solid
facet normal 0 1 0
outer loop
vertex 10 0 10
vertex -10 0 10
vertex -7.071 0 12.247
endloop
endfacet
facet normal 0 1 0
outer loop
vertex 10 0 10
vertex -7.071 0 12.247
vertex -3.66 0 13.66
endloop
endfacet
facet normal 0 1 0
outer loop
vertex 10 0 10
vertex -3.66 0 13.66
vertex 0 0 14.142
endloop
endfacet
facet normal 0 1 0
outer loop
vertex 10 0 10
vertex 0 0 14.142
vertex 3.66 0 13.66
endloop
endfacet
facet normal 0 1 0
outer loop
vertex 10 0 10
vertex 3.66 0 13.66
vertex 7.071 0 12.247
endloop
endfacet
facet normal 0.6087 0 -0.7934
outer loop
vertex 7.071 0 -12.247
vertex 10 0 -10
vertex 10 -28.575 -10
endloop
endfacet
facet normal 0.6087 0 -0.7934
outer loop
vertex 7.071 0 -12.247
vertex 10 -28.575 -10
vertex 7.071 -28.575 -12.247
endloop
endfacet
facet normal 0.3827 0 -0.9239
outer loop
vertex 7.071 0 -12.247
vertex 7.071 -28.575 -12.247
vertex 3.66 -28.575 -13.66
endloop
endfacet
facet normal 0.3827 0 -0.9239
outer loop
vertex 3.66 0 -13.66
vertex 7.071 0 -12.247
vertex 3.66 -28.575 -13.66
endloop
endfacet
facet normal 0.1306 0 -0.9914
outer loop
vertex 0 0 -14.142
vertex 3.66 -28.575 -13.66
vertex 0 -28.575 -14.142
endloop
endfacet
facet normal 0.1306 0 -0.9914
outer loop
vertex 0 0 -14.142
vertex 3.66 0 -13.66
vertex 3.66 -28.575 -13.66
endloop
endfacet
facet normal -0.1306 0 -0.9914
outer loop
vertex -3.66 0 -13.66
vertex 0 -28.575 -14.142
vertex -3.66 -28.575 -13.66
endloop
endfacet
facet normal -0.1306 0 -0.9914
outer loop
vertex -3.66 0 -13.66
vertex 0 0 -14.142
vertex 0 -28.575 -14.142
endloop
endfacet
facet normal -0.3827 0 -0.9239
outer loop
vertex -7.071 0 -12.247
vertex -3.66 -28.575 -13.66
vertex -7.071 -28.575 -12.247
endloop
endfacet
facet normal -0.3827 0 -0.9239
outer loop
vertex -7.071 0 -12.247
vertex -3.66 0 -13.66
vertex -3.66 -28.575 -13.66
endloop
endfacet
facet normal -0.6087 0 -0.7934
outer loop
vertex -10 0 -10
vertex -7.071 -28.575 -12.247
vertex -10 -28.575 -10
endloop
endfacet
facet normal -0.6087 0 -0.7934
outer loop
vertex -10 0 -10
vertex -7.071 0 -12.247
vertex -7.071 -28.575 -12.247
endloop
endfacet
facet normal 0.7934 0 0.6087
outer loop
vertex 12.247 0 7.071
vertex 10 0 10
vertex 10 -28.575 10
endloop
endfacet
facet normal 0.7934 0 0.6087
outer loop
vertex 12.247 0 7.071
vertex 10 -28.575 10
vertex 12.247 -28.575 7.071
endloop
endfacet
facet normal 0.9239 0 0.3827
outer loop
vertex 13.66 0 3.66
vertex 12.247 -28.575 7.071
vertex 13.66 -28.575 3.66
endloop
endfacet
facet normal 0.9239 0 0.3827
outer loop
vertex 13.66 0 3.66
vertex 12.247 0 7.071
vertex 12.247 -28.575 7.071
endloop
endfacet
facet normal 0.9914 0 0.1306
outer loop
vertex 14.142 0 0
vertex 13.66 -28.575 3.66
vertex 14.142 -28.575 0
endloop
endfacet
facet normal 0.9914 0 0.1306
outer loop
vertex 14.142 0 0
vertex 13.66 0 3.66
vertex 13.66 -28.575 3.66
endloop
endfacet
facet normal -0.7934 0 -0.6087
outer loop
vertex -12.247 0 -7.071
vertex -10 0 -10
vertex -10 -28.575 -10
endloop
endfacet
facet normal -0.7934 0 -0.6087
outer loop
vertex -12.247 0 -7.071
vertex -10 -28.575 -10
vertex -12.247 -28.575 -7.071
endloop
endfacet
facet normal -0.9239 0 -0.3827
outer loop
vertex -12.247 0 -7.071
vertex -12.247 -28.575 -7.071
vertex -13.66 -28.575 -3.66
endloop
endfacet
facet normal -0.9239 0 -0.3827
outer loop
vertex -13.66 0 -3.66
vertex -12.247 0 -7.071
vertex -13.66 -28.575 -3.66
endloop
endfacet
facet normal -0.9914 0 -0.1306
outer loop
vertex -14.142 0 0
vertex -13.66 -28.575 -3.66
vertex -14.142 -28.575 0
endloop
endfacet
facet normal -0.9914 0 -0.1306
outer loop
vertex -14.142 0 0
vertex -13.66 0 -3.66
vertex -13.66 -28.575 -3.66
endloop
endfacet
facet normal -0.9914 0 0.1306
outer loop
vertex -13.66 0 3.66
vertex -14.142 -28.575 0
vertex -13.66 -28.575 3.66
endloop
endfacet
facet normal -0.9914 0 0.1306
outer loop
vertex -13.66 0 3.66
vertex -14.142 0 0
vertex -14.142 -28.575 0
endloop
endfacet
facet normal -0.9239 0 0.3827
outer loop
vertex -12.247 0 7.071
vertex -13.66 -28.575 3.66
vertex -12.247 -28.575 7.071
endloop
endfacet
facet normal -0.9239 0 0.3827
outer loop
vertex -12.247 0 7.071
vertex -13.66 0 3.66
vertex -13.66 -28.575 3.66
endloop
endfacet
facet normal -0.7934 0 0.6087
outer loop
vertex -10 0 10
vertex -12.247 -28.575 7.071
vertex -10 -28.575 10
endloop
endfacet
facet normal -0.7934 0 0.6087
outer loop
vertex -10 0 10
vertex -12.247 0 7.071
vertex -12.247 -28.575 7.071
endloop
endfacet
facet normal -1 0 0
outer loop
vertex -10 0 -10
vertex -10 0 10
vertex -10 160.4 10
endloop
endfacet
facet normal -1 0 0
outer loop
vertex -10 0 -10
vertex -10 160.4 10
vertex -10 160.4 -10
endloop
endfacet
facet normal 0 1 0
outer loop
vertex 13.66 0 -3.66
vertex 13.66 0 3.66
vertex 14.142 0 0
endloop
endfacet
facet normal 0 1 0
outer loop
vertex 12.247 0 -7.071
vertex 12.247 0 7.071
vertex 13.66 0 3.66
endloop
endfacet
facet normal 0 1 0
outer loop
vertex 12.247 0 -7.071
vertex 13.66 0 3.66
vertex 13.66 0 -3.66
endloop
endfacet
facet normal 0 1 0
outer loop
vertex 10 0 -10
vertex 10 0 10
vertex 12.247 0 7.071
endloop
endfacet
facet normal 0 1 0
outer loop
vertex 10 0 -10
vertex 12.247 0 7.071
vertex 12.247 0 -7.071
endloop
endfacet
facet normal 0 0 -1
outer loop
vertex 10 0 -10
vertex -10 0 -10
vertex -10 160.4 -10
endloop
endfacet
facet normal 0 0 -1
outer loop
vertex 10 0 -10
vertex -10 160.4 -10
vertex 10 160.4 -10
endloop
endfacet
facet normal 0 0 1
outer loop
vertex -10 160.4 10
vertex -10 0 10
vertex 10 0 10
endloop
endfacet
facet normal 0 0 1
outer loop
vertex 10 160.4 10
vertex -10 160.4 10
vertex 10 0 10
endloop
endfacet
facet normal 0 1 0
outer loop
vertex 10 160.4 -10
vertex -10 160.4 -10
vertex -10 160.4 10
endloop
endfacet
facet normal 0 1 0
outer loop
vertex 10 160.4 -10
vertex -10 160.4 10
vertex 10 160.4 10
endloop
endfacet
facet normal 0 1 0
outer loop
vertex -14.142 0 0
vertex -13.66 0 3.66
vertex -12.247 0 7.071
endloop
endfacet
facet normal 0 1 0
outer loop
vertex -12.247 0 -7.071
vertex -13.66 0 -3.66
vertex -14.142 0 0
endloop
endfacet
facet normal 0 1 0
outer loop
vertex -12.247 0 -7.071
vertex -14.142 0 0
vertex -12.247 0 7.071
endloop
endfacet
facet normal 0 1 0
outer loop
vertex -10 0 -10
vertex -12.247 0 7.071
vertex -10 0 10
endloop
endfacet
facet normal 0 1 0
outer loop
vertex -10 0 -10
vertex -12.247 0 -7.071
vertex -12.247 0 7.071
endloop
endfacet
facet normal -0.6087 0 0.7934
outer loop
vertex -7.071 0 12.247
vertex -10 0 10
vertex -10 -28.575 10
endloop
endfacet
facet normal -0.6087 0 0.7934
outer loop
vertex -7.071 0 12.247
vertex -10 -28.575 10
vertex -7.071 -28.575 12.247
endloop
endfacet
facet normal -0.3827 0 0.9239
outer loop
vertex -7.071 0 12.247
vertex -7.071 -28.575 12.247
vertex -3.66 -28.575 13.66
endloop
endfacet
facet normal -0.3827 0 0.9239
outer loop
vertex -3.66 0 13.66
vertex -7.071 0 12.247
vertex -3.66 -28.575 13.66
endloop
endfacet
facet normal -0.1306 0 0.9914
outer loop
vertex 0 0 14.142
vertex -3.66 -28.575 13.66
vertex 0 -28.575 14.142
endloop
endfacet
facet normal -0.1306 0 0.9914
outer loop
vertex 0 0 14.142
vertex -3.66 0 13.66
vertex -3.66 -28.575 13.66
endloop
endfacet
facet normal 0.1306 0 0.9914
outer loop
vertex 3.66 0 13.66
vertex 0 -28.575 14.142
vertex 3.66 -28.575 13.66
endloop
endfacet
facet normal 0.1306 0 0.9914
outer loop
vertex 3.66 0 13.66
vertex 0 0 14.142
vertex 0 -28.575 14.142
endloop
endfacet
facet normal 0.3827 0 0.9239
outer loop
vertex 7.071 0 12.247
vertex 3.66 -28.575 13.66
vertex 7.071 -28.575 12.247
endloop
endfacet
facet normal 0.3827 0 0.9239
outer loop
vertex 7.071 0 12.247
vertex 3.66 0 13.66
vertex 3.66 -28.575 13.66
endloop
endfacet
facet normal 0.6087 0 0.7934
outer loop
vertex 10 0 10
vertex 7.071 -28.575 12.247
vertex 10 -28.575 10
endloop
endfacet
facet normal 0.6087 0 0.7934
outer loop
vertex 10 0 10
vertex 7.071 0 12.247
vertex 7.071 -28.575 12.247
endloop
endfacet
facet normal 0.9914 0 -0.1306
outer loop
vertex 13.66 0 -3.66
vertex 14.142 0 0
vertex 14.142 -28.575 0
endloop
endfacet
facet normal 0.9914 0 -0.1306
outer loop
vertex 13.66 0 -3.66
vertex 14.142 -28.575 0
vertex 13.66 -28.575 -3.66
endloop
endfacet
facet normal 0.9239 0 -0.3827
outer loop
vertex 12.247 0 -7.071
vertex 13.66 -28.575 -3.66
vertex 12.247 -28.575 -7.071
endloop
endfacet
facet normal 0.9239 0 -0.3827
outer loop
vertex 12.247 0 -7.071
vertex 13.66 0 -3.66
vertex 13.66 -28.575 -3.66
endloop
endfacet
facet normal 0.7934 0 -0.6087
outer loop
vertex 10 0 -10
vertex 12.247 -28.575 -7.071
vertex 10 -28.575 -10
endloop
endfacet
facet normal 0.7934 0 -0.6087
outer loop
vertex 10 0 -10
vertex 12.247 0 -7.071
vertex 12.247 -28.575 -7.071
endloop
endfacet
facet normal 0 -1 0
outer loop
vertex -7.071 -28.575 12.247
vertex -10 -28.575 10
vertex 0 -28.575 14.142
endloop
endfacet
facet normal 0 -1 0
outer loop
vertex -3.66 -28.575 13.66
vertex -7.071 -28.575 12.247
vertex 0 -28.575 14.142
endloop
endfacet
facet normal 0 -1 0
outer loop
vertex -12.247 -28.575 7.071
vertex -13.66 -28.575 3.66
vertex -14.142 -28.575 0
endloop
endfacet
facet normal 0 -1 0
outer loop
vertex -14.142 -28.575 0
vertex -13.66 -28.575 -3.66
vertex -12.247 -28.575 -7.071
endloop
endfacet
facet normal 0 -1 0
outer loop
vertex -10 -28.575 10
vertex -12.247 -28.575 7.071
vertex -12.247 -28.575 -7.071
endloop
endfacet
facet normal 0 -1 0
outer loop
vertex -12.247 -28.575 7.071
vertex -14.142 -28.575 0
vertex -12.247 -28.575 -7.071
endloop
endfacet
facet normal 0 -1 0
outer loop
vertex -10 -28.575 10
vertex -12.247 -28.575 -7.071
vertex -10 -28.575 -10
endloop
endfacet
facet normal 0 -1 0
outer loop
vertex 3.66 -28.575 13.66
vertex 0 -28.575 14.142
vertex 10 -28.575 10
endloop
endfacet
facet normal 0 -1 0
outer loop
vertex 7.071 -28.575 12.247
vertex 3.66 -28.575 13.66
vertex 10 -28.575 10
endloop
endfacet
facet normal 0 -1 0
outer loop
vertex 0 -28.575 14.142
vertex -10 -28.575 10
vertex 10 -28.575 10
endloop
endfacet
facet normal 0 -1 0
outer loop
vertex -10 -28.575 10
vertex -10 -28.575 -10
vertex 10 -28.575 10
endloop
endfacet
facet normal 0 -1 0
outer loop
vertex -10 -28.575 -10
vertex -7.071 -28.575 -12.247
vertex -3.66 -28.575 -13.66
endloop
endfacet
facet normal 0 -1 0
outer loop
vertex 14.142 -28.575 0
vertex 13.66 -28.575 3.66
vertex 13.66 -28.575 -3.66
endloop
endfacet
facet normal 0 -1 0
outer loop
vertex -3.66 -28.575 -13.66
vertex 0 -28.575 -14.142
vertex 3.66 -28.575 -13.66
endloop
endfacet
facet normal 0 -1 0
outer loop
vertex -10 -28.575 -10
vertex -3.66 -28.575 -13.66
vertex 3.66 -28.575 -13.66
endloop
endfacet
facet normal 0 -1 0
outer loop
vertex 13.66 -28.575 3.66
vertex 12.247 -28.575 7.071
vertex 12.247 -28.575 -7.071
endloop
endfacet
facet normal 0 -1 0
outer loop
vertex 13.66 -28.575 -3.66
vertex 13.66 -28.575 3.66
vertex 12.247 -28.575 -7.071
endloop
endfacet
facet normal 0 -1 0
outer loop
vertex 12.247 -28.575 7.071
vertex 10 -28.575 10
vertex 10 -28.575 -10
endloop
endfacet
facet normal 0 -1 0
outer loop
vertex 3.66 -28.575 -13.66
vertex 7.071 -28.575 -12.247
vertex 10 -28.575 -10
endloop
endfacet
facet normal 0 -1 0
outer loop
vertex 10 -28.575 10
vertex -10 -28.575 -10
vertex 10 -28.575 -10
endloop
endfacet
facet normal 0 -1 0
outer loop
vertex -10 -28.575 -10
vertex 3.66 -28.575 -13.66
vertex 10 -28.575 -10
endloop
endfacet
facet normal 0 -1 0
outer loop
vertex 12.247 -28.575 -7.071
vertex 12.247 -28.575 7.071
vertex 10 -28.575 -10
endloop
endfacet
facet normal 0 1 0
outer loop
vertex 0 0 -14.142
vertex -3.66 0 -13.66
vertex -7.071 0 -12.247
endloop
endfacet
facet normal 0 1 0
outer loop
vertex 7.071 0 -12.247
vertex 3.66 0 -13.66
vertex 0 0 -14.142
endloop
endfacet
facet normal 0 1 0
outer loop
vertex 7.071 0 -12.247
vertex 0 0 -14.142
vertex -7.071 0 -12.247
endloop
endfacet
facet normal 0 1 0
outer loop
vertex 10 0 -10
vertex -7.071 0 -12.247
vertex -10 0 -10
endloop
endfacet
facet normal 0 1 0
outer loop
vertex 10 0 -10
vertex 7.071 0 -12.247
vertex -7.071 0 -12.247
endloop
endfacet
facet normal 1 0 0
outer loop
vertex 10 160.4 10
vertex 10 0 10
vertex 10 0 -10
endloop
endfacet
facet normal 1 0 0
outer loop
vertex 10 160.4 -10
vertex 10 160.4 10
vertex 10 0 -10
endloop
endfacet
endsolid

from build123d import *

# Parameters (mm, degrees)
SKETCH1_W           = 20
SKETCH1_H           = 20
BOSS_EXTRUDE2_DEPTH = 160.4
SKETCH1_3_W         = 20
SKETCH1_3_H         = 20
BOSS_EXTRUDE3_DEPTH = 28.575


with BuildPart() as part:
    # Sketch1 → Boss-Extrude2 (new body)
    with BuildSketch(Plane(origin=(0, 0, 0), x_dir=(1, 0, 0), z_dir=(0, 1, 0))):
        Rectangle(SKETCH1_W, SKETCH1_H)
    extrude(amount=BOSS_EXTRUDE2_DEPTH)

    # Sketch1_3 → Boss-Extrude3 (add)
    with BuildSketch(Plane(origin=(0, 0, 0), x_dir=(1, 0, 0), z_dir=(0, 1, 0))):
        with BuildLine():
            Line((10, -10), (-10, -10))
            ThreePointArc((-10, -10), (0, -14.142135624), (10, -10))
        make_face()
        with BuildLine():
            ThreePointArc((-10, 10), (-14.142135624, 0), (-10, -10))
            Line((-10, -10), (-10, 10))
        make_face()
        Rectangle(SKETCH1_3_W, SKETCH1_3_H)
        with BuildLine():
            Line((10, 10), (10, -10))
            ThreePointArc((10, -10), (13.065629649, -5.411961001), (14.142135624, 0))
            ThreePointArc((14.142135624, 0), (13.065629649, 5.411961001), (10, 10))
        make_face()
        with BuildLine():
            ThreePointArc((10, 10), (0, 14.142135624), (-10, 10))
            Line((-10, 10), (10, 10))
        make_face()
    extrude(amount=-BOSS_EXTRUDE3_DEPTH)


solid = part.part
